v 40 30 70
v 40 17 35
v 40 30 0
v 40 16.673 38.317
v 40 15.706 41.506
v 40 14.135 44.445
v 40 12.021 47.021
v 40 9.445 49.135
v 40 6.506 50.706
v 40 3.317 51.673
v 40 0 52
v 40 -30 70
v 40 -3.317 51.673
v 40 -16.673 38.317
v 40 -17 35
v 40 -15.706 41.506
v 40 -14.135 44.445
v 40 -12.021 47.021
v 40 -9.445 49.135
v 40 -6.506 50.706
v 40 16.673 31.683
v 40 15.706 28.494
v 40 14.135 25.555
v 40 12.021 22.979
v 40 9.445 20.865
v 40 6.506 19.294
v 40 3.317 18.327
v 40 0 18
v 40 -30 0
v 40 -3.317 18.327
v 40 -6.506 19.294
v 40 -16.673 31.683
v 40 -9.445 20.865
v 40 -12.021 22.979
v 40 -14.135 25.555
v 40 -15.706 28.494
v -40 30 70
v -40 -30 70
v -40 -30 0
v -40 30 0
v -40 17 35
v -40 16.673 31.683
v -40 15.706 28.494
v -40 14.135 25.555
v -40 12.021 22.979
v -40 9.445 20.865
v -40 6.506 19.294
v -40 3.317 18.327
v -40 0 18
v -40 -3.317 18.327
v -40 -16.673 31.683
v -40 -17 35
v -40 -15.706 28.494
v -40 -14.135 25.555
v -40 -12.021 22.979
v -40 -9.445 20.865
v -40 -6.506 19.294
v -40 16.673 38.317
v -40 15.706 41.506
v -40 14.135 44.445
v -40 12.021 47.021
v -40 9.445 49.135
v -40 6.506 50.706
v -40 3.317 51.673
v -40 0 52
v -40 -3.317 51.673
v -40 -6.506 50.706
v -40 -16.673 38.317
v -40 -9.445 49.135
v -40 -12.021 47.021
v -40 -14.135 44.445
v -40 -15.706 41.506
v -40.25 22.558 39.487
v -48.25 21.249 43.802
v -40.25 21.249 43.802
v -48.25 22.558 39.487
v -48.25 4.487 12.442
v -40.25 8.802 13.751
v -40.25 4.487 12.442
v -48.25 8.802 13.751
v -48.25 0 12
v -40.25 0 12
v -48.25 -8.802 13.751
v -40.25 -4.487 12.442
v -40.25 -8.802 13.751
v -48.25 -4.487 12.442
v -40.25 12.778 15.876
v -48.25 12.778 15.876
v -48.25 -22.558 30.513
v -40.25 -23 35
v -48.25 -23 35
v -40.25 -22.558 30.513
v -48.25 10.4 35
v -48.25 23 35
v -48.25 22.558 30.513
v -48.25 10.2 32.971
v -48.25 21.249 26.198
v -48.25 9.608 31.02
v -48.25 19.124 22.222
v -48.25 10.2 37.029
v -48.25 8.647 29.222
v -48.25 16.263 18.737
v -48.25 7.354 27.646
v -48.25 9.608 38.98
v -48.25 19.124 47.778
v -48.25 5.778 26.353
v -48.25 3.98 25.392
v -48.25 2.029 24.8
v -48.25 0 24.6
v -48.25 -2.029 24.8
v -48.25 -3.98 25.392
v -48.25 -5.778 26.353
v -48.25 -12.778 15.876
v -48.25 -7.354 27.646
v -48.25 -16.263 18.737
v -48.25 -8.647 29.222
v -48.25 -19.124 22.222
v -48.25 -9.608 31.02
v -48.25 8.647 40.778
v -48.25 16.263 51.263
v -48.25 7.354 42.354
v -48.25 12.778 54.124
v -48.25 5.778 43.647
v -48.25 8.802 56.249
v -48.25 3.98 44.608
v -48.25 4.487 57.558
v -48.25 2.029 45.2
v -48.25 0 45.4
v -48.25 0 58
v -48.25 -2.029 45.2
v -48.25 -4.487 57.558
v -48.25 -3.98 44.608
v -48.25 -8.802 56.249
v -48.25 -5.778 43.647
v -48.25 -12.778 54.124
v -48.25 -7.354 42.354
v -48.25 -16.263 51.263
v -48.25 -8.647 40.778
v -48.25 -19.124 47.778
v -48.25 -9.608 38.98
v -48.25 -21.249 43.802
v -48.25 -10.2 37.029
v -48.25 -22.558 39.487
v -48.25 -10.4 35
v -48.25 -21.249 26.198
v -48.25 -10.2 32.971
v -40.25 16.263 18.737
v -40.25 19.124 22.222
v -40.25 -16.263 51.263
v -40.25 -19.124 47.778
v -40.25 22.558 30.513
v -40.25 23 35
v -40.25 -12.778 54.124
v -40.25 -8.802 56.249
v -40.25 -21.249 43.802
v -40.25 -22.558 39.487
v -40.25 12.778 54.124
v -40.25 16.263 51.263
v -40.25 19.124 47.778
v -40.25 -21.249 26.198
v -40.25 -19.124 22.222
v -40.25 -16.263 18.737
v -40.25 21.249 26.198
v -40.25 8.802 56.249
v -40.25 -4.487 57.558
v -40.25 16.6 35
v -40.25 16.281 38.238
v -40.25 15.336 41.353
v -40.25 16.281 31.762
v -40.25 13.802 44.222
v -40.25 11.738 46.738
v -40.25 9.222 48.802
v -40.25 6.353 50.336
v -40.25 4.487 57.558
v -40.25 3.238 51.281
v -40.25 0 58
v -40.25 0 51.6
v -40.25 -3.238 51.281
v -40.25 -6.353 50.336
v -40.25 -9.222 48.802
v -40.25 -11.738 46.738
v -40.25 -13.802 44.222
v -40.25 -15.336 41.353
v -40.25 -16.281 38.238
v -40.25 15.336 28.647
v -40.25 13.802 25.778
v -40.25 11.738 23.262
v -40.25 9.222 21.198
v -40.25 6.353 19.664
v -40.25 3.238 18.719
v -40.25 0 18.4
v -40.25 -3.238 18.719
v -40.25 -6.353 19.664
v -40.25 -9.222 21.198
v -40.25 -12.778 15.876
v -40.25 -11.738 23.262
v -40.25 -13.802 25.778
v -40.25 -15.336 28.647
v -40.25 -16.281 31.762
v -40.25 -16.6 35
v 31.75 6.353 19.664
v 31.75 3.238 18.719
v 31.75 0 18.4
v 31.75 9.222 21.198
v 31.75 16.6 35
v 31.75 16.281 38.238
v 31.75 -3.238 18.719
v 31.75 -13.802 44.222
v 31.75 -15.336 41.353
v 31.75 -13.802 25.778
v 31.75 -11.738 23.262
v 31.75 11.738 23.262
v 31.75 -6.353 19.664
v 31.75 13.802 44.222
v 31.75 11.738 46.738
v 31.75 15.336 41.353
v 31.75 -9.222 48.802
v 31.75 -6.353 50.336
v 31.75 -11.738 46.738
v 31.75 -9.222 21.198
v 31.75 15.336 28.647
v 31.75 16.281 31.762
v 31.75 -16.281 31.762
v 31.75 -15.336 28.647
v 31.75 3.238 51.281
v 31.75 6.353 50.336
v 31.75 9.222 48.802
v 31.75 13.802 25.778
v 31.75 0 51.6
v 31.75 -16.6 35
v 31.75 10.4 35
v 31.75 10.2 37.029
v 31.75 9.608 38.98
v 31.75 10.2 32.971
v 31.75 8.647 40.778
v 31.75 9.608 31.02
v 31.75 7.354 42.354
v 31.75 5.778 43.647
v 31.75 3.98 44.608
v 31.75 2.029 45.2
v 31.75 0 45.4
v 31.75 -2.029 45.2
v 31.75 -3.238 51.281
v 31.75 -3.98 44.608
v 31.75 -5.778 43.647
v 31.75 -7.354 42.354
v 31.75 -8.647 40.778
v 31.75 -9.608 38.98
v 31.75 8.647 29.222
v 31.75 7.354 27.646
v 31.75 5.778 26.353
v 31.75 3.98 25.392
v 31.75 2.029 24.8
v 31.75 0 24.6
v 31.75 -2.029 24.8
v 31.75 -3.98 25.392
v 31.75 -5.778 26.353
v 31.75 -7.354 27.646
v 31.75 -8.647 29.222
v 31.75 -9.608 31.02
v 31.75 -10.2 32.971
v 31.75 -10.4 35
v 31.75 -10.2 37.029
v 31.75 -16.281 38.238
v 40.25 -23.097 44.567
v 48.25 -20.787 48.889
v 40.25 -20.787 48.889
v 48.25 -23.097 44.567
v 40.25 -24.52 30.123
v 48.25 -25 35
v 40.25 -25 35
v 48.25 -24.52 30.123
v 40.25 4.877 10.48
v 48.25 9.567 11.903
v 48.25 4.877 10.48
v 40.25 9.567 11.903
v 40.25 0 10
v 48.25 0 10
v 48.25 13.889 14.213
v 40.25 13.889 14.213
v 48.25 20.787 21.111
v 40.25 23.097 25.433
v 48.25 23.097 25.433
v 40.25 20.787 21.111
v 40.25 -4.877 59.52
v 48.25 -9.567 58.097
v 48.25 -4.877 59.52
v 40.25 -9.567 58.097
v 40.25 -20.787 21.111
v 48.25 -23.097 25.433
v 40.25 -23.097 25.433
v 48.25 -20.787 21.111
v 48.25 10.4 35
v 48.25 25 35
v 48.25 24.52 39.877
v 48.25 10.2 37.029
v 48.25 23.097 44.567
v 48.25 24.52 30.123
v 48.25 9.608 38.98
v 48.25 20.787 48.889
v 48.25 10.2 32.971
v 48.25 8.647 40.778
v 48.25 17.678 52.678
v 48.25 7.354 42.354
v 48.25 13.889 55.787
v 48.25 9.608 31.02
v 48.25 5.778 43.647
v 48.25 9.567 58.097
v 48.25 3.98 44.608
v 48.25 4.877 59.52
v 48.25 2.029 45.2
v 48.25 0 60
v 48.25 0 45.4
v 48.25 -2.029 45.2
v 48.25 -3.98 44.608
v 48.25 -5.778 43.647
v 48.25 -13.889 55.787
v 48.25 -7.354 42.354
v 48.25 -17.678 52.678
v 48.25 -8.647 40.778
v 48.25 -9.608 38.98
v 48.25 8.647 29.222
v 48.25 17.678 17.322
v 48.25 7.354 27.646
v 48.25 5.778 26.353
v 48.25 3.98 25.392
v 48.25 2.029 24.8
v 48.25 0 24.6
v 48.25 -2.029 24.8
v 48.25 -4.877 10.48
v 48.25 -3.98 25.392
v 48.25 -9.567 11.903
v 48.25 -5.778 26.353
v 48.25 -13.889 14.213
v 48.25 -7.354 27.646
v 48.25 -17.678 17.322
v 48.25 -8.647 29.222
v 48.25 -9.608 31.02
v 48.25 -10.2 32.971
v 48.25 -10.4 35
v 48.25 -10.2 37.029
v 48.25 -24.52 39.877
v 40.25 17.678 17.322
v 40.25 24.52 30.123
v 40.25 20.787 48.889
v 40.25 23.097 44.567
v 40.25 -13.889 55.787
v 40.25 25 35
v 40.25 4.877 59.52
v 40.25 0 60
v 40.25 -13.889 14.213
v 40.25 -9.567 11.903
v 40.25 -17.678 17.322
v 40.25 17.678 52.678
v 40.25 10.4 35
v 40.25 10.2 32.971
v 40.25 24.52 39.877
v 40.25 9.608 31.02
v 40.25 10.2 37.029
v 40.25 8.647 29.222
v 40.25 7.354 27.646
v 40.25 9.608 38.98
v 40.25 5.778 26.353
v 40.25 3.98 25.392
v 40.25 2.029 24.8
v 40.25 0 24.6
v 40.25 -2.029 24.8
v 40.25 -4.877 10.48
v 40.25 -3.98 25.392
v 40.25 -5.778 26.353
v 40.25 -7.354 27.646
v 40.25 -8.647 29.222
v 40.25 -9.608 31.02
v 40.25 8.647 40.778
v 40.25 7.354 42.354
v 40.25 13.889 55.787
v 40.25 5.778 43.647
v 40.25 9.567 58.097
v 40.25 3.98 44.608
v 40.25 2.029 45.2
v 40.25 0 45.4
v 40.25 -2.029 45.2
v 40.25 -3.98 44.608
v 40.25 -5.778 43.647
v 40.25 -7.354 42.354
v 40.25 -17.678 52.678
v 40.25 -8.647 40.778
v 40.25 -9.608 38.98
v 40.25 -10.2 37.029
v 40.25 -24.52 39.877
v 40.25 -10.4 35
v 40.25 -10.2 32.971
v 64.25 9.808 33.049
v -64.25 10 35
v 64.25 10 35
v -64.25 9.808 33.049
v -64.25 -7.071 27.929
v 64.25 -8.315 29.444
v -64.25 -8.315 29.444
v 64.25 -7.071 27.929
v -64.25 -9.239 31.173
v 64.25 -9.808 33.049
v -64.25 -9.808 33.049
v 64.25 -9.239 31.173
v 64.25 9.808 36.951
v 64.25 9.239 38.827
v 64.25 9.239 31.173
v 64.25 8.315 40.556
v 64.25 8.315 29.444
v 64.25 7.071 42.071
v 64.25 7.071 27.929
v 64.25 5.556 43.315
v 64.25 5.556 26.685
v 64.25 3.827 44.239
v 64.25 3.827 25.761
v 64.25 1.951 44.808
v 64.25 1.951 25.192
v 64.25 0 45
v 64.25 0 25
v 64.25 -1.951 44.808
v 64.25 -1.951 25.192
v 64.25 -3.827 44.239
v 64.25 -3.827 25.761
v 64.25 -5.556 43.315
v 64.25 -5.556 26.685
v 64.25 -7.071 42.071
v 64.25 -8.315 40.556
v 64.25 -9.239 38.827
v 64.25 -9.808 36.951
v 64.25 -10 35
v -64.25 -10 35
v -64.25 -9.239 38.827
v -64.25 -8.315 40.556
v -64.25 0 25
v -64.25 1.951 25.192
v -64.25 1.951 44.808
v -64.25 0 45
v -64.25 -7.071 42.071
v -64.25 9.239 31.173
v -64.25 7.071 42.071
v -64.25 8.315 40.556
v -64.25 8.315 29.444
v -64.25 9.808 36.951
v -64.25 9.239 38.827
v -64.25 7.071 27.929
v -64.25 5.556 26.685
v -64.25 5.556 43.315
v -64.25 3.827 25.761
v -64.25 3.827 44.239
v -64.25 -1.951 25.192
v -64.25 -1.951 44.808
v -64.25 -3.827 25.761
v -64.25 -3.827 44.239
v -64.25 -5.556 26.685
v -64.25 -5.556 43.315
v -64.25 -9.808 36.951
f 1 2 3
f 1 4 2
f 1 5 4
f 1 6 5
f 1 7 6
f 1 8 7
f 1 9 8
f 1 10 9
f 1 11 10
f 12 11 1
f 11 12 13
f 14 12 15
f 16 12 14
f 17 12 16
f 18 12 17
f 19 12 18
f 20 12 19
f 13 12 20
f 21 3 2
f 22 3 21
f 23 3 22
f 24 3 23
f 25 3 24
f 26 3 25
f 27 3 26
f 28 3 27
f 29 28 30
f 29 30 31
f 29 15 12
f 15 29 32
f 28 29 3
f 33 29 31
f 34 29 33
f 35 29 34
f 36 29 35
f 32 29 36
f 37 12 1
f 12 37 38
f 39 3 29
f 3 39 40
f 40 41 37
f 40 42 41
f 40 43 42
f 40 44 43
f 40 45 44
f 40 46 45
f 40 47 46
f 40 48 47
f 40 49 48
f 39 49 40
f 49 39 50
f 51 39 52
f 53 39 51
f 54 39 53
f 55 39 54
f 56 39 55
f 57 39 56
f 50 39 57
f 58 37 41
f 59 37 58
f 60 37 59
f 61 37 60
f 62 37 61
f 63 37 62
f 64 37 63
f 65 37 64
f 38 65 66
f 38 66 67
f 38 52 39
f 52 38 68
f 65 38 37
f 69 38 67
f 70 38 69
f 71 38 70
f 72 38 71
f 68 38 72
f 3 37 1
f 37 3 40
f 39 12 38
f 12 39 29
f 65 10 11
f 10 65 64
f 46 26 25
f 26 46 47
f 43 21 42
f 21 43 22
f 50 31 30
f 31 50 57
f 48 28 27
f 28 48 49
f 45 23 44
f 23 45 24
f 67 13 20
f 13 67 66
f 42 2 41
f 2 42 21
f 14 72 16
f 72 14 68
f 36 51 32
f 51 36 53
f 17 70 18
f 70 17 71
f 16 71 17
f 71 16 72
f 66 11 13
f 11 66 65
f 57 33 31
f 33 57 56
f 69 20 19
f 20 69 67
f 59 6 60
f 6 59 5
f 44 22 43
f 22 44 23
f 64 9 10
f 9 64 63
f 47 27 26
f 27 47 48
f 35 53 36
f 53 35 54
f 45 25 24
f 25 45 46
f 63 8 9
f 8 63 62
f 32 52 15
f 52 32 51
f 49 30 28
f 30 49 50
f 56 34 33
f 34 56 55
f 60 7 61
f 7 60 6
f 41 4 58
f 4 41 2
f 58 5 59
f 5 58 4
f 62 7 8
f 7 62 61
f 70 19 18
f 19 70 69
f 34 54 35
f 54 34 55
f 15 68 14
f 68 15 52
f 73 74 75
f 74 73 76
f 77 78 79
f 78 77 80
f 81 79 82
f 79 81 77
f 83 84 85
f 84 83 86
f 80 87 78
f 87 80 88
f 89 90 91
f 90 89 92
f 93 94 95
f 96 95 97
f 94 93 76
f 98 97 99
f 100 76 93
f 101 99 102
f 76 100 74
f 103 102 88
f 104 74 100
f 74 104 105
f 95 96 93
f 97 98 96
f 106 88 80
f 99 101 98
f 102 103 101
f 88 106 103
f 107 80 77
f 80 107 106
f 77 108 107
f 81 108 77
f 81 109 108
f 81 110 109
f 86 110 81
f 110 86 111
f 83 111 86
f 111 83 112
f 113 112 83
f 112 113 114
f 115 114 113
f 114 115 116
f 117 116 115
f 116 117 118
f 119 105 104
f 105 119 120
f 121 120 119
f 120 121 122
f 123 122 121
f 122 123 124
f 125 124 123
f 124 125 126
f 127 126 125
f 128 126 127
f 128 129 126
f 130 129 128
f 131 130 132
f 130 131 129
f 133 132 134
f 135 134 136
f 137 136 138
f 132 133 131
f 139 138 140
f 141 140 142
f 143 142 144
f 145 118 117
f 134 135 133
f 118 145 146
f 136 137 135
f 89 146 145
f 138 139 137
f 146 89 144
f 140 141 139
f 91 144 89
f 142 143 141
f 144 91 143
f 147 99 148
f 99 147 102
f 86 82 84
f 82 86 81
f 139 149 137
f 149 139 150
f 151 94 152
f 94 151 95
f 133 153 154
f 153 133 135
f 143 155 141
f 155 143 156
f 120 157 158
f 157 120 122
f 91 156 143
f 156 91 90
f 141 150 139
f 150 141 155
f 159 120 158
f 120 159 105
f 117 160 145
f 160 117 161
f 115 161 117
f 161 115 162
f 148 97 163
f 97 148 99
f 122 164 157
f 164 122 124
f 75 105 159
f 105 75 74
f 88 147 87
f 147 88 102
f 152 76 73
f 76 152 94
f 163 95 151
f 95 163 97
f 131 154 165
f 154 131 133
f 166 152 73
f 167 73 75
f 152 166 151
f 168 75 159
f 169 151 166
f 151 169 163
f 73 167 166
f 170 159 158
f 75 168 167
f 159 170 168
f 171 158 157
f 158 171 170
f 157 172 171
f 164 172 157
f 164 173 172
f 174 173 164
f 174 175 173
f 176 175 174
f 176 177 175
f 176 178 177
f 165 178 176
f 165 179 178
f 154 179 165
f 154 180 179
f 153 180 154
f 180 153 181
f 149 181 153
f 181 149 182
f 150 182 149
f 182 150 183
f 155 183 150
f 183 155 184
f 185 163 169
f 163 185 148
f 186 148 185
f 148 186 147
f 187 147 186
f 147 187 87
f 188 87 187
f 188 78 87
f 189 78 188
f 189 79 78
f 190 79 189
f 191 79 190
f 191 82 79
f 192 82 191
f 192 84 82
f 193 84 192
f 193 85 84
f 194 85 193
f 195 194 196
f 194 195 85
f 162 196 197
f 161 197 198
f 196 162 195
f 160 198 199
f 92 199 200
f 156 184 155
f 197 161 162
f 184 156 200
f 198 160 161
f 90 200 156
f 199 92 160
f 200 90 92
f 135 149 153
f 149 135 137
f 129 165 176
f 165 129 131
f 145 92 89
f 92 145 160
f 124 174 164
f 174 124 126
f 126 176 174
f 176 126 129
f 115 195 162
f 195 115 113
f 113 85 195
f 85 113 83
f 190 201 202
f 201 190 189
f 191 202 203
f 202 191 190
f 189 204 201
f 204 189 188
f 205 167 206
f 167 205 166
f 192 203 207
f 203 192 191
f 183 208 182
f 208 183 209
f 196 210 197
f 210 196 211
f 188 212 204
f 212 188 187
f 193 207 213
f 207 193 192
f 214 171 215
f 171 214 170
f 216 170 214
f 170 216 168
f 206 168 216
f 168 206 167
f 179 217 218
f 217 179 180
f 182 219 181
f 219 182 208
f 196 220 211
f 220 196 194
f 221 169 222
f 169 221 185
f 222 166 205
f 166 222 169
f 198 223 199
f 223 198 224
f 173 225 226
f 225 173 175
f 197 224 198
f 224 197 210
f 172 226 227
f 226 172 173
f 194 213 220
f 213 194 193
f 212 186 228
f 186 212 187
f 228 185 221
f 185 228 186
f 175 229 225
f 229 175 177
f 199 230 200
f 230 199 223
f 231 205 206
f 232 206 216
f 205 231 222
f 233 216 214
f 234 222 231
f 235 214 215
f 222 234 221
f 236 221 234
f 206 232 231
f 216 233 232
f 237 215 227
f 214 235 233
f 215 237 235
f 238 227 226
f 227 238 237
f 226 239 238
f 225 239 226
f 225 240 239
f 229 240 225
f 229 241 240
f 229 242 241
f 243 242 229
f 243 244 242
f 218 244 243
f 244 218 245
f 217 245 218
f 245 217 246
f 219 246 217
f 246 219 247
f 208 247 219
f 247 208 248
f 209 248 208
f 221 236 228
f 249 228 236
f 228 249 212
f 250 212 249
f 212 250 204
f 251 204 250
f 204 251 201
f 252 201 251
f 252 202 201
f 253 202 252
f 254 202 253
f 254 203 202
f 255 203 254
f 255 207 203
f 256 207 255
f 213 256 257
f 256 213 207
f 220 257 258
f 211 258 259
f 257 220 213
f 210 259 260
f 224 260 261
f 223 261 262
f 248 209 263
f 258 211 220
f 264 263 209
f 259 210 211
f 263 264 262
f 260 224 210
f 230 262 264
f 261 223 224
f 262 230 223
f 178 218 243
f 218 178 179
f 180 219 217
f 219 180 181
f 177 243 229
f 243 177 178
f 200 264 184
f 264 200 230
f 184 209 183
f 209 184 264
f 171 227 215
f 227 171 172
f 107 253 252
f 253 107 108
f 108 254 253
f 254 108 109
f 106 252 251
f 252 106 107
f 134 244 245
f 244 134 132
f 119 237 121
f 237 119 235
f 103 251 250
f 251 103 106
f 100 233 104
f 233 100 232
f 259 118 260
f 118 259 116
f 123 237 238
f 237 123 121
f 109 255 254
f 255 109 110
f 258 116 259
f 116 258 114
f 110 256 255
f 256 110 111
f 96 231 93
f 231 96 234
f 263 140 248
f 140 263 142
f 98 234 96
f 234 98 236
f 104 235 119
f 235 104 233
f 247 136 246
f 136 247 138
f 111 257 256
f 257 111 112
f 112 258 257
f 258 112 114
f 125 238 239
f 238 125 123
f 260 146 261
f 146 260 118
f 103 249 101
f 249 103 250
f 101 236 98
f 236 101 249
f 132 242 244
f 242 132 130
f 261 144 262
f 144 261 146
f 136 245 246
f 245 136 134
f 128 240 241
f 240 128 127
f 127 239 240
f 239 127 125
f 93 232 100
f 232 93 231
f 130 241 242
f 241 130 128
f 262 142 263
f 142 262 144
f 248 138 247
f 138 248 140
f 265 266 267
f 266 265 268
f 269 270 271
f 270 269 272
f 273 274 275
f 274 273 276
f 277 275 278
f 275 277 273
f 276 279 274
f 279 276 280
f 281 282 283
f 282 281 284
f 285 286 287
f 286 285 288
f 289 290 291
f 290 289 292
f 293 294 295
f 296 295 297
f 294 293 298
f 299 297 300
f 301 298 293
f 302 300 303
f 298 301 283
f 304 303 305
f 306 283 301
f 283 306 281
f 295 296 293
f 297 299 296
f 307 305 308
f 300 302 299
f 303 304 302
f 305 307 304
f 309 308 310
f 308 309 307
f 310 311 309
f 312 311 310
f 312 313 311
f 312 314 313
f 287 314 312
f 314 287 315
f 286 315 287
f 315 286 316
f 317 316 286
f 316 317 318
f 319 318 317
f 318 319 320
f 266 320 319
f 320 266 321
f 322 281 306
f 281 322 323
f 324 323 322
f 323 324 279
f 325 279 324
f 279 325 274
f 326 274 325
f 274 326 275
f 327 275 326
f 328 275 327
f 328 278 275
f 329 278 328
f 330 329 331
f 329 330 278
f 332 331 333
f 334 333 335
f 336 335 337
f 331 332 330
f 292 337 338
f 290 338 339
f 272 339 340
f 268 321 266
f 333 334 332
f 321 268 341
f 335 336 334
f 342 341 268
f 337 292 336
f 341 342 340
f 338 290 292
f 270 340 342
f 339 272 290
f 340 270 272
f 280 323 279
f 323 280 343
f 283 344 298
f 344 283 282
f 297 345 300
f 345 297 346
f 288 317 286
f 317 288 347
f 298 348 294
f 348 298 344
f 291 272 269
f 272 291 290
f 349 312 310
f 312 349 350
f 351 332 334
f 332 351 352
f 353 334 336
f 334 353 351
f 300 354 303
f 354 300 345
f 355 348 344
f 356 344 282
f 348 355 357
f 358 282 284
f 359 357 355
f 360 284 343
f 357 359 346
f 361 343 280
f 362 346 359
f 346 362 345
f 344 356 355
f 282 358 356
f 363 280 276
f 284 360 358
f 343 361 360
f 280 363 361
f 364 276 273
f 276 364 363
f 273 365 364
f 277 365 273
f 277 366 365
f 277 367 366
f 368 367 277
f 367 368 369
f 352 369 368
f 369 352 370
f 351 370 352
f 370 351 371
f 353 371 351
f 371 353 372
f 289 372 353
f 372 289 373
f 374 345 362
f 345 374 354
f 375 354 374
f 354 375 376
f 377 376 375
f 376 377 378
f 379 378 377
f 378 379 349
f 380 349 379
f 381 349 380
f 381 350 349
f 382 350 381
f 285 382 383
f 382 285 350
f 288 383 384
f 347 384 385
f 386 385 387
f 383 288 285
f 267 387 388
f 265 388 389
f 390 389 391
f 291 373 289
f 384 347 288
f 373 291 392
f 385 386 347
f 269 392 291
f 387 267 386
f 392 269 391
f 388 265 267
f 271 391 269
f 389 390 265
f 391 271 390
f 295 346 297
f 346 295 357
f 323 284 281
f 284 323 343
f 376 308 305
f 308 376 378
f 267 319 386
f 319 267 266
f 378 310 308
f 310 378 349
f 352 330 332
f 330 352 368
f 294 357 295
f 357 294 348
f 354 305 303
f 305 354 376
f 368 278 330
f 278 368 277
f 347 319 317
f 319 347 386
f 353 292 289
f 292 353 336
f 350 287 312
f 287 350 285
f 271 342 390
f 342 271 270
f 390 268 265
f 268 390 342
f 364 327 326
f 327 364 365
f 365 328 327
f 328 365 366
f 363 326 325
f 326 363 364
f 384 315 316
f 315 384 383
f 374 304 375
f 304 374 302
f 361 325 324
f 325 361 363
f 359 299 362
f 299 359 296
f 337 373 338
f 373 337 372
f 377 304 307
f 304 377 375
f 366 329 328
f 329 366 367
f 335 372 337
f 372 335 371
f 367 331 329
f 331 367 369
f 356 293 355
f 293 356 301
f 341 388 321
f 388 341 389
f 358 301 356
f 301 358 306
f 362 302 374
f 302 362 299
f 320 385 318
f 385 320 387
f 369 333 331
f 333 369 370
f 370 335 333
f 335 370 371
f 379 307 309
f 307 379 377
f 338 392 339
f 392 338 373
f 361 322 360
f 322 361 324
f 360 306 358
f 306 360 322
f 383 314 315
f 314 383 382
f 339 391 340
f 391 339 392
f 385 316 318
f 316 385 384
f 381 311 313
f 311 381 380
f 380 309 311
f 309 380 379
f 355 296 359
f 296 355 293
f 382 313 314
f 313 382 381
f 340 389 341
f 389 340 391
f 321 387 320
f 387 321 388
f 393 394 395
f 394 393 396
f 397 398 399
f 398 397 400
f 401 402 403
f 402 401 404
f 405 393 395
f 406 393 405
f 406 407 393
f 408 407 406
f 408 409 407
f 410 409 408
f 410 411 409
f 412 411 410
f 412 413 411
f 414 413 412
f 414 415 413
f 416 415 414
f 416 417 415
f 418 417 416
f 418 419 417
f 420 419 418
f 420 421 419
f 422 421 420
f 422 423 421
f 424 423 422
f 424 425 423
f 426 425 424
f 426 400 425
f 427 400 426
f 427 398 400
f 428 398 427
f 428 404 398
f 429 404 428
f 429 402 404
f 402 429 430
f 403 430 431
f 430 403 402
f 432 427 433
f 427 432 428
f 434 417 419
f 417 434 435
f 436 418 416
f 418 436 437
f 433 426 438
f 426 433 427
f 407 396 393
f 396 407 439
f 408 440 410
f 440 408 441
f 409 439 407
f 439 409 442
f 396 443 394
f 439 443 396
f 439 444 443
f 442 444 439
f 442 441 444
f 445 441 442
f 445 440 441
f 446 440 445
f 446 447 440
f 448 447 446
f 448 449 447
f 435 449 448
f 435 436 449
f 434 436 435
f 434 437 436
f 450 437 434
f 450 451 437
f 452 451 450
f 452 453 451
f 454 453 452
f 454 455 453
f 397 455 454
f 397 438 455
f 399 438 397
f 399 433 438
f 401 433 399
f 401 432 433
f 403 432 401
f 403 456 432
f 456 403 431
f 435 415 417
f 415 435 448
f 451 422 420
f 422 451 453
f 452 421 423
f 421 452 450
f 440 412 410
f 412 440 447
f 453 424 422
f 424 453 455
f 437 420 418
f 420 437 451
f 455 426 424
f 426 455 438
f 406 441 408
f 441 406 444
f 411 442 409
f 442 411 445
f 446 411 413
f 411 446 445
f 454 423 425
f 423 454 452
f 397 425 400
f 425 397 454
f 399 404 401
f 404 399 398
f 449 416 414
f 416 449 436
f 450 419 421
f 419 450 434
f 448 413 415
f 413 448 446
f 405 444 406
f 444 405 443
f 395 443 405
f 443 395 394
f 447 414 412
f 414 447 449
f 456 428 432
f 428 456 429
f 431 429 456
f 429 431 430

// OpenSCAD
$fn = 32;

// ------------------------------------------------------------------------
// Bushed housing: 80 x 60 x 70 mm housing, bushing d33.2
// Every part is its own module, assembly() places them once.
// ------------------------------------------------------------------------

// --- part 1 ---
module housing() {
  difference() {
    translate([-40, -30, 0]) cube([80, 60, 70]);
    translate([0, 0, 35]) rotate([0, 90, 0]) cylinder(h = 82, d = 34, center = true);
  }
}

// --- part 2 ---
module bushing() {
  difference() {
    union() {
      cylinder(h = 8, d = 46);
      translate([0, 0, 8]) cylinder(h = 72, d = 33.2);
    }
    translate([0, 0, -1]) cylinder(h = 82, d = 20.8);
  }
}

// --- part 3 ---
module shaft() {
  translate([0, 0, -64.25]) cylinder(h = 128.5, d = 20);
}

// --- part 4 ---
module cover() {
  difference() {
    cylinder(h = 8, d = 50);
    translate([0, 0, -1]) cylinder(h = 10, d = 20.8);
  }
}

// --- assembly ---
module assembly() {
  translate([0, 0, 0]) rotate([0, 0, 0]) housing();
  translate([-48.25, 0, 35]) rotate([0, 90, 0]) bushing();
  translate([0, 0, 35]) rotate([0, 90, 0]) shaft();
  translate([40.25, 0, 35]) rotate([0, 90, 0]) cover();
}

assembly();
